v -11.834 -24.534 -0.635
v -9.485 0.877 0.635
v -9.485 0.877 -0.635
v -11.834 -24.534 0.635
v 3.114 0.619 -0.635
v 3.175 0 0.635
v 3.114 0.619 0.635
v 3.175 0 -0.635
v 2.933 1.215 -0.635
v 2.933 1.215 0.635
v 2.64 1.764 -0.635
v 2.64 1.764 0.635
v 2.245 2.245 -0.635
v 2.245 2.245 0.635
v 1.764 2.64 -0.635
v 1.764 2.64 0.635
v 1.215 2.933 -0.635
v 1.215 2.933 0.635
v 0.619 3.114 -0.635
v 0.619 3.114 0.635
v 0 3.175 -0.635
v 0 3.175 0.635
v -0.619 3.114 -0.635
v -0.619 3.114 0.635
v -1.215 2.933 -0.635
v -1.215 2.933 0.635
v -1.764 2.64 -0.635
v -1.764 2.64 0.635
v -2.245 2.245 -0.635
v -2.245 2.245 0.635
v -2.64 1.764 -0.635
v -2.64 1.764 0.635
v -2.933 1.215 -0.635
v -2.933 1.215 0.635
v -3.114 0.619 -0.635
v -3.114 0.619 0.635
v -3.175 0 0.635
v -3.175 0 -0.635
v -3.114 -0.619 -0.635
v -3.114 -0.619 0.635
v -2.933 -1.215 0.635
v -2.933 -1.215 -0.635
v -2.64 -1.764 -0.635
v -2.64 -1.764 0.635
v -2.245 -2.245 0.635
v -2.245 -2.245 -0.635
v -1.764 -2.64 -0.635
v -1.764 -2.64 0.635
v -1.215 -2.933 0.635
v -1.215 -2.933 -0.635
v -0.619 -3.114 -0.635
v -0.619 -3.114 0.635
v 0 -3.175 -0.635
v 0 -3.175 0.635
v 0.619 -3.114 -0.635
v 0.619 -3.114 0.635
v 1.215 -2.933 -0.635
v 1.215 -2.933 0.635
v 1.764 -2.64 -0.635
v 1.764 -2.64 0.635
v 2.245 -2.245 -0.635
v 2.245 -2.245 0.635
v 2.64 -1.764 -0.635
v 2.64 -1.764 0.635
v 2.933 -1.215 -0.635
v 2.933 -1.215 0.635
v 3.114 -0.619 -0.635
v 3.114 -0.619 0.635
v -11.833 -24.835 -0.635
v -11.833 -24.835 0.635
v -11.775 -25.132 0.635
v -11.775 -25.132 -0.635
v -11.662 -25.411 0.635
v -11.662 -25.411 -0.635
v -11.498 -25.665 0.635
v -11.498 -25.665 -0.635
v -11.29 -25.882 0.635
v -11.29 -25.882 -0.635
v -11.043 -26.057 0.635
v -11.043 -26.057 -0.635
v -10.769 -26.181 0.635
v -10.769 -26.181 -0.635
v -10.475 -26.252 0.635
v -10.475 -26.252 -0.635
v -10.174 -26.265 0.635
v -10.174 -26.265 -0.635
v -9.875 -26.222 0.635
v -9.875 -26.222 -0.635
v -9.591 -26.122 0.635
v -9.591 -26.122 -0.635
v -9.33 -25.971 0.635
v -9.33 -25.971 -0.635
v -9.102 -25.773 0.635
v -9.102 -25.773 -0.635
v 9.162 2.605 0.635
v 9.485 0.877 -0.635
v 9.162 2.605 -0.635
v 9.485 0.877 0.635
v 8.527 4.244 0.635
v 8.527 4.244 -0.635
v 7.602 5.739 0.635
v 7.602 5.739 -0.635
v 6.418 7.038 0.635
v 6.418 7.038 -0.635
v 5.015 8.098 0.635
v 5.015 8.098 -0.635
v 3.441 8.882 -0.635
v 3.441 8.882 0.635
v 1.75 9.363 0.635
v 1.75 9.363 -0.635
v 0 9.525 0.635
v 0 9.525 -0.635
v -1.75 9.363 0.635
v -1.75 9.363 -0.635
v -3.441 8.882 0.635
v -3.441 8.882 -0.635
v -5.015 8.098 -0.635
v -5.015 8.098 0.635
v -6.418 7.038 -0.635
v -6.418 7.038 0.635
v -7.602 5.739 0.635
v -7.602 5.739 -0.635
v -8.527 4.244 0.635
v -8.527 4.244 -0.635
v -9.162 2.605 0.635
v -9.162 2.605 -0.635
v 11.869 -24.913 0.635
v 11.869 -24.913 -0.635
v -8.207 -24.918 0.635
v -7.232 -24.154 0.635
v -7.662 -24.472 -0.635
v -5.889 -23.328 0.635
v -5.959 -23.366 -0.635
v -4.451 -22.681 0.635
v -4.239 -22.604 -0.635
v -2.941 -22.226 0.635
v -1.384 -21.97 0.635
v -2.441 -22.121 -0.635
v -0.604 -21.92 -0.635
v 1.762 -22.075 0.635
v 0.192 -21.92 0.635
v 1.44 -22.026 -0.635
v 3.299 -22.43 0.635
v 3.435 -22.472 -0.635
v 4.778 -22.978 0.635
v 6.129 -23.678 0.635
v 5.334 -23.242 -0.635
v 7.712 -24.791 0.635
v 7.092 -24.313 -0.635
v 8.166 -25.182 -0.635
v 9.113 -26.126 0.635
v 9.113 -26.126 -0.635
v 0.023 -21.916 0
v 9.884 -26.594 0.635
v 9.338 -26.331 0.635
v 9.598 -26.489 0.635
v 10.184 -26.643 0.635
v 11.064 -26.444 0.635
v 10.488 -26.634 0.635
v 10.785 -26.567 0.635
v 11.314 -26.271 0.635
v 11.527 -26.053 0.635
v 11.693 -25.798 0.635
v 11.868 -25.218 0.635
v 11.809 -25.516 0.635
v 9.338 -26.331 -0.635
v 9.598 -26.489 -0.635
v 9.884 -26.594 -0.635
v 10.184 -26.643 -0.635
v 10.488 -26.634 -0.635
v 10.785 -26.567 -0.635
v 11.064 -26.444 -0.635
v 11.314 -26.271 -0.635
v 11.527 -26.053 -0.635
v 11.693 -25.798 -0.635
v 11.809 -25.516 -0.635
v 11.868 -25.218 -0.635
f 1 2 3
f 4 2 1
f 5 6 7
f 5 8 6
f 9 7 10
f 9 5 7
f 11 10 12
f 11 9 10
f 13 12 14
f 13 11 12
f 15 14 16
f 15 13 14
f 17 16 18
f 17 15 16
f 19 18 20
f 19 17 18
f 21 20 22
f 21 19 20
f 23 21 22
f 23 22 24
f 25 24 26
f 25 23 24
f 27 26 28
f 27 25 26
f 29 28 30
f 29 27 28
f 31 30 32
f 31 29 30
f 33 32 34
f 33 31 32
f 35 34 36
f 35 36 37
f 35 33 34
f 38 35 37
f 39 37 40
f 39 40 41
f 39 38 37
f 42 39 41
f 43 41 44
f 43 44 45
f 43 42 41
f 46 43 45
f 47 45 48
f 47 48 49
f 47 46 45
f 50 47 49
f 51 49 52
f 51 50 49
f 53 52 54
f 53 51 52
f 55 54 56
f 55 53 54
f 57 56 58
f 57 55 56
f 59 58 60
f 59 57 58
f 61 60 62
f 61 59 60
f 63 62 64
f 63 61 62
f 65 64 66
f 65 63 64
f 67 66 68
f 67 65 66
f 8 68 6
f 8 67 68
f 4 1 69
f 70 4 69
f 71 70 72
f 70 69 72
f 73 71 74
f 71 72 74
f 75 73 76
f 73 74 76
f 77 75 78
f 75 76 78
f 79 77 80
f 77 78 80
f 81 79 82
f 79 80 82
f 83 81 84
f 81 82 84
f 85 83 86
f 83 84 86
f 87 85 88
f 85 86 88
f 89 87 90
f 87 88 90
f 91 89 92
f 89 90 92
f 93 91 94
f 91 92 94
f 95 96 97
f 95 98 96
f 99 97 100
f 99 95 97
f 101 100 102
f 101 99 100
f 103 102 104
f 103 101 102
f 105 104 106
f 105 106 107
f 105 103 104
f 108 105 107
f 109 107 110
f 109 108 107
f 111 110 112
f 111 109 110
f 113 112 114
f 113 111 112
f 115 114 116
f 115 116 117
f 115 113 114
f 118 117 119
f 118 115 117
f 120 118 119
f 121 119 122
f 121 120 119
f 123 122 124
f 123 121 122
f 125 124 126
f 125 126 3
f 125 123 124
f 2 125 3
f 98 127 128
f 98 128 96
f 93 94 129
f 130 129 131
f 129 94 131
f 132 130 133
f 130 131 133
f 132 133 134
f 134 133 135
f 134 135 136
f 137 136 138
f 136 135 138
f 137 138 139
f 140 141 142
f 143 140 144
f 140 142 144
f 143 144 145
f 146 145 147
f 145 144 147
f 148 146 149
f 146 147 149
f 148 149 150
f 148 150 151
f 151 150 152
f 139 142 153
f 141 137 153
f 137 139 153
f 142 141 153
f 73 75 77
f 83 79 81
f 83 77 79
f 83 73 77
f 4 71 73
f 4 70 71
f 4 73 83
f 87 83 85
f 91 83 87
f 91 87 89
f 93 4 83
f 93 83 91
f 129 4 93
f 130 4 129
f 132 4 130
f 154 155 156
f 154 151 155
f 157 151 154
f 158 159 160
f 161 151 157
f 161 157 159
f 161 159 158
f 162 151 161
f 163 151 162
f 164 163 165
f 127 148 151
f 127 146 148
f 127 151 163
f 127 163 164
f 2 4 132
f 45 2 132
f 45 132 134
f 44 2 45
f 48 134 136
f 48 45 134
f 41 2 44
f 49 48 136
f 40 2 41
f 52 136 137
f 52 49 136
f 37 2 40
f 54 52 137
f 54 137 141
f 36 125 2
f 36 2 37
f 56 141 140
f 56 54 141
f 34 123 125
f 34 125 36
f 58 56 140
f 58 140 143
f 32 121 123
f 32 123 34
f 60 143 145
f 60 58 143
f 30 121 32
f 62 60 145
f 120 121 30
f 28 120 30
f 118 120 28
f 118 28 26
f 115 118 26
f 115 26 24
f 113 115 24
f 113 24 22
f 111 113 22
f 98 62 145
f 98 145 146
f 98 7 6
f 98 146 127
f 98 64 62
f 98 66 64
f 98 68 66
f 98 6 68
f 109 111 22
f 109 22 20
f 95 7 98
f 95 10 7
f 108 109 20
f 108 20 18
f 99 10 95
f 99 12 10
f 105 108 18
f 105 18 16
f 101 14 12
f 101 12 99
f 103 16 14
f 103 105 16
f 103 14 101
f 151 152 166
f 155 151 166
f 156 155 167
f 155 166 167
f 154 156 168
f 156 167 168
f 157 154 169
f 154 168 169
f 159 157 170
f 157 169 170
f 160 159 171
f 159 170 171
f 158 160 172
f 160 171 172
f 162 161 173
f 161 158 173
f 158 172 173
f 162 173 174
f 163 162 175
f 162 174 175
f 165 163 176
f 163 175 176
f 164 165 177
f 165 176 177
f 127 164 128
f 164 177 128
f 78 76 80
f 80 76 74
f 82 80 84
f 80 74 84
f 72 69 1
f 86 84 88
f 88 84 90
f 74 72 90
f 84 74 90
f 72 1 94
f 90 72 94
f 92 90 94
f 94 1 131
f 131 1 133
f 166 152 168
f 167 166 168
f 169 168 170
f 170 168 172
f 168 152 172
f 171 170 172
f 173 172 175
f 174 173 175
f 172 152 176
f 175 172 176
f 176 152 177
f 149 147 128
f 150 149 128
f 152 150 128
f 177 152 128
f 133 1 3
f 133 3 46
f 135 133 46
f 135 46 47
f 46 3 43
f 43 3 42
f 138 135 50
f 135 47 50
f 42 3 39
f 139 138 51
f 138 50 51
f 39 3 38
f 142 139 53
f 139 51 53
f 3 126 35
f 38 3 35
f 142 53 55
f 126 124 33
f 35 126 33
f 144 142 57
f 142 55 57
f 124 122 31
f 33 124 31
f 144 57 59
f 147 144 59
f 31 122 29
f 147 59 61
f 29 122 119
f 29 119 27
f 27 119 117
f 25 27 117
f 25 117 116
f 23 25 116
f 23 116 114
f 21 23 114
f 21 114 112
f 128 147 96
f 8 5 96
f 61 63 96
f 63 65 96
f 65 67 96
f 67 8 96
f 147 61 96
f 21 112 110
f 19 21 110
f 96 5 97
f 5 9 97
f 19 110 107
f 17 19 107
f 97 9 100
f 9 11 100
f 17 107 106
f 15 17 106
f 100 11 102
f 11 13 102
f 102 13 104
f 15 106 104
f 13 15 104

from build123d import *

# Parameters (mm, degrees)
SKETCH1_R           = 3.175
BOSS_EXTRUDE1_DEPTH = 0.635
SKETCH3_R           = 12.7
CUT_EXTRUDE1_DEPTH  = 239.777071188
CUT_EXTRUDE2_DEPTH  = 2.54


with BuildPart() as part:
    # Sketch1 → Boss-Extrude1 (new, symmetric)
    with BuildSketch(Plane.XY):
        with BuildLine():
            Line((-9.484545184, 0.876942223), (-12.115371852, -27.576693328))
            Line((-12.115371852, -27.576693328), (12.115371852, -27.576693328))
            Line((12.115371852, -27.576693328), (9.484545184, 0.876942223))
            ThreePointArc((9.484545184, 0.876942223), (0, 9.525), (-9.484545184, 0.876942223))
        make_face()
        Circle(SKETCH1_R, mode=Mode.SUBTRACT)
    extrude(amount=BOSS_EXTRUDE1_DEPTH, both=True)

    # Sketch3 → Cut-Extrude1 (cut, through all)
    with BuildSketch(Plane(origin=(-10.234654006, 38.091107641, -227.844114987), x_dir=(-0.9990889360534101, -0.013334766916774946, 0.04053987971048249), z_dir=(-0.04267601884298755, 0.30693794962268295, -0.9507722400749491))):
        Circle(SKETCH3_R)
    extrude(amount=-CUT_EXTRUDE1_DEPTH, mode=Mode.SUBTRACT)

    # Sketch4 → Cut-Extrude2 (cut)
    with BuildSketch(Plane(origin=(0, 0, -0.635), x_dir=(-1, 0, 0), z_dir=(0, 0, -1))):
        with BuildLine():
            Line((-12.115371852, -27.576693328), (12.115371852, -27.576693328))
            Line((12.115371852, -27.576693328), (11.834023856, -24.533781602))
            ThreePointArc((11.834023856, -24.533781602), (10.909017726, -26.125672484), (9.101988814, -25.772969444))
            add(Edge.make_bspline(
                [(9.101988814, -25.772969444), (-0.049020897, -16.134309997), (-9.112527933, -26.125826157)],
                knots=[5.634452132, 5.634452132, 5.634452132, 7.231690845, 7.231690845, 7.231690845], degree=2, weights=[1, 0.697696458, 1]))
            ThreePointArc((-9.112527933, -26.125826157), (-10.927624329, -26.512315749), (-11.869092937, -24.913070304))
            Line((-11.869092937, -24.913070304), (-12.115371852, -27.576693328))
        make_face()
    extrude(amount=-CUT_EXTRUDE2_DEPTH, mode=Mode.SUBTRACT)


solid = part.part
